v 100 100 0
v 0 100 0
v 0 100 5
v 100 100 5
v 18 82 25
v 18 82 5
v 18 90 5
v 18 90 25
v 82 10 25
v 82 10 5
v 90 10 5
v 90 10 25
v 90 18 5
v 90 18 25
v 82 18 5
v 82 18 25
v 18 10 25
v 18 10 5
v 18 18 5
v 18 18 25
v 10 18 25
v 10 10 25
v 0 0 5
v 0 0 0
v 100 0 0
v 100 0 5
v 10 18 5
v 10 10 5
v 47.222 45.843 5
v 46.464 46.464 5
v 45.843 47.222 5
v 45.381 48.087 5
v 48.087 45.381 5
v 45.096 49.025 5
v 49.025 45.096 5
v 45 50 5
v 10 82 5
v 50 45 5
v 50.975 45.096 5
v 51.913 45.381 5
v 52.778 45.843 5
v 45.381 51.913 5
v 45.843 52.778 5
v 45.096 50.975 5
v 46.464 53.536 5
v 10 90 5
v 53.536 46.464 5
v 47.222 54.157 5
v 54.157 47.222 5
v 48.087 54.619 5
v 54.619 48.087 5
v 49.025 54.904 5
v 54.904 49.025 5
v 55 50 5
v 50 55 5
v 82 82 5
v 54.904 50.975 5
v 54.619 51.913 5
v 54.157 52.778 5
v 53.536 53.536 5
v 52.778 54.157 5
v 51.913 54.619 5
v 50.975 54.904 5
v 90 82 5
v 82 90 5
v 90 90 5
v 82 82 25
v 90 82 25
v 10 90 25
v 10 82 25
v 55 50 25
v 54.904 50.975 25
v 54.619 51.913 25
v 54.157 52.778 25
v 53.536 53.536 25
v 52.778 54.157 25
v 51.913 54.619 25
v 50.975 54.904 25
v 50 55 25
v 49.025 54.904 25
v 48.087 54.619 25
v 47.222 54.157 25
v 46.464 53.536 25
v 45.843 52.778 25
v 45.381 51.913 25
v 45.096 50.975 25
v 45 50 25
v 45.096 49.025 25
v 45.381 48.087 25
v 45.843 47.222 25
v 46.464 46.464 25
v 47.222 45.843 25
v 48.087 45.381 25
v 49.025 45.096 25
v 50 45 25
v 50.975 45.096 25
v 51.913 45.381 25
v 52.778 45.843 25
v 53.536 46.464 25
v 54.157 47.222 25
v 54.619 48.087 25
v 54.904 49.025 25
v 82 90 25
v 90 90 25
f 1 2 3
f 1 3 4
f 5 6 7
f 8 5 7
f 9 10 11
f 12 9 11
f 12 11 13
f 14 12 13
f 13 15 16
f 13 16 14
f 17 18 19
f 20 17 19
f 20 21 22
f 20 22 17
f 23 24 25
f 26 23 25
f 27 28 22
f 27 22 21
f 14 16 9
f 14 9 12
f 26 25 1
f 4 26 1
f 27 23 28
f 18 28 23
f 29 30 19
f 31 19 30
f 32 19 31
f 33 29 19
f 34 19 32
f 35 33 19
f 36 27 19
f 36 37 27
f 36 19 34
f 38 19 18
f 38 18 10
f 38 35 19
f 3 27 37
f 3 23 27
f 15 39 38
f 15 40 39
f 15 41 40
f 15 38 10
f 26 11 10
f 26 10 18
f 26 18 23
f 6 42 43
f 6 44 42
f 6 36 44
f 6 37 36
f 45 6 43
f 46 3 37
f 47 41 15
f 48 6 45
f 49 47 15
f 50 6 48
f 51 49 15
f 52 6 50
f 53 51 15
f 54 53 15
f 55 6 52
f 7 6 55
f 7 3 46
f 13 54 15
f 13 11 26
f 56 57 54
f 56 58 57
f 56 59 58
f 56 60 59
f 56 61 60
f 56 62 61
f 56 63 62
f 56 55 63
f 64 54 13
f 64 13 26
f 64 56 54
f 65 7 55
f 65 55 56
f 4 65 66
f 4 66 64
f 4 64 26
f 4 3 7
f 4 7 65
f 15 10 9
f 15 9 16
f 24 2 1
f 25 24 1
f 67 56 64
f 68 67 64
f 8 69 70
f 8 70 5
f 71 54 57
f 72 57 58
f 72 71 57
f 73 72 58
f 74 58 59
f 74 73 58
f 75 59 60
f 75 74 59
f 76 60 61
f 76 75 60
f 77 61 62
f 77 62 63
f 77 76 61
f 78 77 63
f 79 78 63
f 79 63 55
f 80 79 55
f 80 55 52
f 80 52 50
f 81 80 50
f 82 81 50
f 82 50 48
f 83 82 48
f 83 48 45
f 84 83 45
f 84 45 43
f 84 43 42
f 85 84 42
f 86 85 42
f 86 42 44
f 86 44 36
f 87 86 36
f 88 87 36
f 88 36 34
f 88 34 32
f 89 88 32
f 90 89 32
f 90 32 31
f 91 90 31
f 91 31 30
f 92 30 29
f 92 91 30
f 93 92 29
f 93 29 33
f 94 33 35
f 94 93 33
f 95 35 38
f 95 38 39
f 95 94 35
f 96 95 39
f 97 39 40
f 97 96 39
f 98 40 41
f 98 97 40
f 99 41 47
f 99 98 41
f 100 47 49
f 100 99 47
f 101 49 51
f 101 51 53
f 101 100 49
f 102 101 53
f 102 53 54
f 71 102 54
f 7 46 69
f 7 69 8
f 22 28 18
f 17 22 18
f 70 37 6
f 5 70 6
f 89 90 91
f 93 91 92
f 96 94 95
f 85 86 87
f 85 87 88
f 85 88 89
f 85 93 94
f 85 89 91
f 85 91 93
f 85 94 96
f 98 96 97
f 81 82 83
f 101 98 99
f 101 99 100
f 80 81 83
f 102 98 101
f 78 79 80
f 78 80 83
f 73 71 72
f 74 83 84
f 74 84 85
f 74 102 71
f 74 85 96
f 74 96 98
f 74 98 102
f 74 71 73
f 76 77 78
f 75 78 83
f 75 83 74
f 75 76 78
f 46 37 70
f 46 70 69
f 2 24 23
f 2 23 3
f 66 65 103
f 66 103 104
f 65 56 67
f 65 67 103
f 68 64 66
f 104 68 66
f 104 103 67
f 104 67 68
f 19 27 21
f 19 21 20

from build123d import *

# Parameters (mm, degrees)
SKETCH_1_W          = 100
SKETCH_1_H          = 100
EXTRUDE_1_DEPTH     = 25
SKETCH_2_W          = 100
SKETCH_2_H          = 100
SKETCH_2_W_2        = 8
SKETCH_2_H_2        = 8
CUT_EXTRUDE_1_DEPTH = 20
EXTRUDE_2_REACH     = 145.614
SKETCH_3_R          = 5


with BuildPart() as part:
    # 草图1 → 凸台-拉伸1 (new body)
    with BuildSketch(Plane.XY):
        with Locations((50, 50)):
            Rectangle(SKETCH_1_W, SKETCH_1_H)
    extrude(amount=EXTRUDE_1_DEPTH)

    # 草图2 → 切除-拉伸1 (cut)
    with BuildSketch(Plane.XY.offset(25)):
        with Locations((50, 50)):
            Rectangle(SKETCH_2_W, SKETCH_2_H)
        with Locations((14, 86)):
            Rectangle(SKETCH_2_W_2, SKETCH_2_H_2, mode=Mode.SUBTRACT)
        with Locations((86, 86)):
            Rectangle(SKETCH_2_W_2, SKETCH_2_H_2, mode=Mode.SUBTRACT)
        with Locations((14, 14)):
            Rectangle(SKETCH_2_W_2, SKETCH_2_H_2, mode=Mode.SUBTRACT)
        with Locations((86, 14)):
            Rectangle(SKETCH_2_W_2, SKETCH_2_H_2, mode=Mode.SUBTRACT)
    extrude(amount=-CUT_EXTRUDE_1_DEPTH, mode=Mode.SUBTRACT)

    # 草图3 → 凸台-拉伸2 (add, up to next)
    with BuildSketch(Plane.XY.offset(25), mode=Mode.PRIVATE) as extrude_2_sk1:
        with Locations((50, 50)):
            Circle(SKETCH_3_R)
    extrude_2_tool1 = extrude(extrude_2_sk1.sketch, amount=-EXTRUDE_2_REACH, mode=Mode.PRIVATE) - part.part
    add(extrude_2_tool1.solids().sort_by_distance((50, 50, 25))[0])


solid = part.part
